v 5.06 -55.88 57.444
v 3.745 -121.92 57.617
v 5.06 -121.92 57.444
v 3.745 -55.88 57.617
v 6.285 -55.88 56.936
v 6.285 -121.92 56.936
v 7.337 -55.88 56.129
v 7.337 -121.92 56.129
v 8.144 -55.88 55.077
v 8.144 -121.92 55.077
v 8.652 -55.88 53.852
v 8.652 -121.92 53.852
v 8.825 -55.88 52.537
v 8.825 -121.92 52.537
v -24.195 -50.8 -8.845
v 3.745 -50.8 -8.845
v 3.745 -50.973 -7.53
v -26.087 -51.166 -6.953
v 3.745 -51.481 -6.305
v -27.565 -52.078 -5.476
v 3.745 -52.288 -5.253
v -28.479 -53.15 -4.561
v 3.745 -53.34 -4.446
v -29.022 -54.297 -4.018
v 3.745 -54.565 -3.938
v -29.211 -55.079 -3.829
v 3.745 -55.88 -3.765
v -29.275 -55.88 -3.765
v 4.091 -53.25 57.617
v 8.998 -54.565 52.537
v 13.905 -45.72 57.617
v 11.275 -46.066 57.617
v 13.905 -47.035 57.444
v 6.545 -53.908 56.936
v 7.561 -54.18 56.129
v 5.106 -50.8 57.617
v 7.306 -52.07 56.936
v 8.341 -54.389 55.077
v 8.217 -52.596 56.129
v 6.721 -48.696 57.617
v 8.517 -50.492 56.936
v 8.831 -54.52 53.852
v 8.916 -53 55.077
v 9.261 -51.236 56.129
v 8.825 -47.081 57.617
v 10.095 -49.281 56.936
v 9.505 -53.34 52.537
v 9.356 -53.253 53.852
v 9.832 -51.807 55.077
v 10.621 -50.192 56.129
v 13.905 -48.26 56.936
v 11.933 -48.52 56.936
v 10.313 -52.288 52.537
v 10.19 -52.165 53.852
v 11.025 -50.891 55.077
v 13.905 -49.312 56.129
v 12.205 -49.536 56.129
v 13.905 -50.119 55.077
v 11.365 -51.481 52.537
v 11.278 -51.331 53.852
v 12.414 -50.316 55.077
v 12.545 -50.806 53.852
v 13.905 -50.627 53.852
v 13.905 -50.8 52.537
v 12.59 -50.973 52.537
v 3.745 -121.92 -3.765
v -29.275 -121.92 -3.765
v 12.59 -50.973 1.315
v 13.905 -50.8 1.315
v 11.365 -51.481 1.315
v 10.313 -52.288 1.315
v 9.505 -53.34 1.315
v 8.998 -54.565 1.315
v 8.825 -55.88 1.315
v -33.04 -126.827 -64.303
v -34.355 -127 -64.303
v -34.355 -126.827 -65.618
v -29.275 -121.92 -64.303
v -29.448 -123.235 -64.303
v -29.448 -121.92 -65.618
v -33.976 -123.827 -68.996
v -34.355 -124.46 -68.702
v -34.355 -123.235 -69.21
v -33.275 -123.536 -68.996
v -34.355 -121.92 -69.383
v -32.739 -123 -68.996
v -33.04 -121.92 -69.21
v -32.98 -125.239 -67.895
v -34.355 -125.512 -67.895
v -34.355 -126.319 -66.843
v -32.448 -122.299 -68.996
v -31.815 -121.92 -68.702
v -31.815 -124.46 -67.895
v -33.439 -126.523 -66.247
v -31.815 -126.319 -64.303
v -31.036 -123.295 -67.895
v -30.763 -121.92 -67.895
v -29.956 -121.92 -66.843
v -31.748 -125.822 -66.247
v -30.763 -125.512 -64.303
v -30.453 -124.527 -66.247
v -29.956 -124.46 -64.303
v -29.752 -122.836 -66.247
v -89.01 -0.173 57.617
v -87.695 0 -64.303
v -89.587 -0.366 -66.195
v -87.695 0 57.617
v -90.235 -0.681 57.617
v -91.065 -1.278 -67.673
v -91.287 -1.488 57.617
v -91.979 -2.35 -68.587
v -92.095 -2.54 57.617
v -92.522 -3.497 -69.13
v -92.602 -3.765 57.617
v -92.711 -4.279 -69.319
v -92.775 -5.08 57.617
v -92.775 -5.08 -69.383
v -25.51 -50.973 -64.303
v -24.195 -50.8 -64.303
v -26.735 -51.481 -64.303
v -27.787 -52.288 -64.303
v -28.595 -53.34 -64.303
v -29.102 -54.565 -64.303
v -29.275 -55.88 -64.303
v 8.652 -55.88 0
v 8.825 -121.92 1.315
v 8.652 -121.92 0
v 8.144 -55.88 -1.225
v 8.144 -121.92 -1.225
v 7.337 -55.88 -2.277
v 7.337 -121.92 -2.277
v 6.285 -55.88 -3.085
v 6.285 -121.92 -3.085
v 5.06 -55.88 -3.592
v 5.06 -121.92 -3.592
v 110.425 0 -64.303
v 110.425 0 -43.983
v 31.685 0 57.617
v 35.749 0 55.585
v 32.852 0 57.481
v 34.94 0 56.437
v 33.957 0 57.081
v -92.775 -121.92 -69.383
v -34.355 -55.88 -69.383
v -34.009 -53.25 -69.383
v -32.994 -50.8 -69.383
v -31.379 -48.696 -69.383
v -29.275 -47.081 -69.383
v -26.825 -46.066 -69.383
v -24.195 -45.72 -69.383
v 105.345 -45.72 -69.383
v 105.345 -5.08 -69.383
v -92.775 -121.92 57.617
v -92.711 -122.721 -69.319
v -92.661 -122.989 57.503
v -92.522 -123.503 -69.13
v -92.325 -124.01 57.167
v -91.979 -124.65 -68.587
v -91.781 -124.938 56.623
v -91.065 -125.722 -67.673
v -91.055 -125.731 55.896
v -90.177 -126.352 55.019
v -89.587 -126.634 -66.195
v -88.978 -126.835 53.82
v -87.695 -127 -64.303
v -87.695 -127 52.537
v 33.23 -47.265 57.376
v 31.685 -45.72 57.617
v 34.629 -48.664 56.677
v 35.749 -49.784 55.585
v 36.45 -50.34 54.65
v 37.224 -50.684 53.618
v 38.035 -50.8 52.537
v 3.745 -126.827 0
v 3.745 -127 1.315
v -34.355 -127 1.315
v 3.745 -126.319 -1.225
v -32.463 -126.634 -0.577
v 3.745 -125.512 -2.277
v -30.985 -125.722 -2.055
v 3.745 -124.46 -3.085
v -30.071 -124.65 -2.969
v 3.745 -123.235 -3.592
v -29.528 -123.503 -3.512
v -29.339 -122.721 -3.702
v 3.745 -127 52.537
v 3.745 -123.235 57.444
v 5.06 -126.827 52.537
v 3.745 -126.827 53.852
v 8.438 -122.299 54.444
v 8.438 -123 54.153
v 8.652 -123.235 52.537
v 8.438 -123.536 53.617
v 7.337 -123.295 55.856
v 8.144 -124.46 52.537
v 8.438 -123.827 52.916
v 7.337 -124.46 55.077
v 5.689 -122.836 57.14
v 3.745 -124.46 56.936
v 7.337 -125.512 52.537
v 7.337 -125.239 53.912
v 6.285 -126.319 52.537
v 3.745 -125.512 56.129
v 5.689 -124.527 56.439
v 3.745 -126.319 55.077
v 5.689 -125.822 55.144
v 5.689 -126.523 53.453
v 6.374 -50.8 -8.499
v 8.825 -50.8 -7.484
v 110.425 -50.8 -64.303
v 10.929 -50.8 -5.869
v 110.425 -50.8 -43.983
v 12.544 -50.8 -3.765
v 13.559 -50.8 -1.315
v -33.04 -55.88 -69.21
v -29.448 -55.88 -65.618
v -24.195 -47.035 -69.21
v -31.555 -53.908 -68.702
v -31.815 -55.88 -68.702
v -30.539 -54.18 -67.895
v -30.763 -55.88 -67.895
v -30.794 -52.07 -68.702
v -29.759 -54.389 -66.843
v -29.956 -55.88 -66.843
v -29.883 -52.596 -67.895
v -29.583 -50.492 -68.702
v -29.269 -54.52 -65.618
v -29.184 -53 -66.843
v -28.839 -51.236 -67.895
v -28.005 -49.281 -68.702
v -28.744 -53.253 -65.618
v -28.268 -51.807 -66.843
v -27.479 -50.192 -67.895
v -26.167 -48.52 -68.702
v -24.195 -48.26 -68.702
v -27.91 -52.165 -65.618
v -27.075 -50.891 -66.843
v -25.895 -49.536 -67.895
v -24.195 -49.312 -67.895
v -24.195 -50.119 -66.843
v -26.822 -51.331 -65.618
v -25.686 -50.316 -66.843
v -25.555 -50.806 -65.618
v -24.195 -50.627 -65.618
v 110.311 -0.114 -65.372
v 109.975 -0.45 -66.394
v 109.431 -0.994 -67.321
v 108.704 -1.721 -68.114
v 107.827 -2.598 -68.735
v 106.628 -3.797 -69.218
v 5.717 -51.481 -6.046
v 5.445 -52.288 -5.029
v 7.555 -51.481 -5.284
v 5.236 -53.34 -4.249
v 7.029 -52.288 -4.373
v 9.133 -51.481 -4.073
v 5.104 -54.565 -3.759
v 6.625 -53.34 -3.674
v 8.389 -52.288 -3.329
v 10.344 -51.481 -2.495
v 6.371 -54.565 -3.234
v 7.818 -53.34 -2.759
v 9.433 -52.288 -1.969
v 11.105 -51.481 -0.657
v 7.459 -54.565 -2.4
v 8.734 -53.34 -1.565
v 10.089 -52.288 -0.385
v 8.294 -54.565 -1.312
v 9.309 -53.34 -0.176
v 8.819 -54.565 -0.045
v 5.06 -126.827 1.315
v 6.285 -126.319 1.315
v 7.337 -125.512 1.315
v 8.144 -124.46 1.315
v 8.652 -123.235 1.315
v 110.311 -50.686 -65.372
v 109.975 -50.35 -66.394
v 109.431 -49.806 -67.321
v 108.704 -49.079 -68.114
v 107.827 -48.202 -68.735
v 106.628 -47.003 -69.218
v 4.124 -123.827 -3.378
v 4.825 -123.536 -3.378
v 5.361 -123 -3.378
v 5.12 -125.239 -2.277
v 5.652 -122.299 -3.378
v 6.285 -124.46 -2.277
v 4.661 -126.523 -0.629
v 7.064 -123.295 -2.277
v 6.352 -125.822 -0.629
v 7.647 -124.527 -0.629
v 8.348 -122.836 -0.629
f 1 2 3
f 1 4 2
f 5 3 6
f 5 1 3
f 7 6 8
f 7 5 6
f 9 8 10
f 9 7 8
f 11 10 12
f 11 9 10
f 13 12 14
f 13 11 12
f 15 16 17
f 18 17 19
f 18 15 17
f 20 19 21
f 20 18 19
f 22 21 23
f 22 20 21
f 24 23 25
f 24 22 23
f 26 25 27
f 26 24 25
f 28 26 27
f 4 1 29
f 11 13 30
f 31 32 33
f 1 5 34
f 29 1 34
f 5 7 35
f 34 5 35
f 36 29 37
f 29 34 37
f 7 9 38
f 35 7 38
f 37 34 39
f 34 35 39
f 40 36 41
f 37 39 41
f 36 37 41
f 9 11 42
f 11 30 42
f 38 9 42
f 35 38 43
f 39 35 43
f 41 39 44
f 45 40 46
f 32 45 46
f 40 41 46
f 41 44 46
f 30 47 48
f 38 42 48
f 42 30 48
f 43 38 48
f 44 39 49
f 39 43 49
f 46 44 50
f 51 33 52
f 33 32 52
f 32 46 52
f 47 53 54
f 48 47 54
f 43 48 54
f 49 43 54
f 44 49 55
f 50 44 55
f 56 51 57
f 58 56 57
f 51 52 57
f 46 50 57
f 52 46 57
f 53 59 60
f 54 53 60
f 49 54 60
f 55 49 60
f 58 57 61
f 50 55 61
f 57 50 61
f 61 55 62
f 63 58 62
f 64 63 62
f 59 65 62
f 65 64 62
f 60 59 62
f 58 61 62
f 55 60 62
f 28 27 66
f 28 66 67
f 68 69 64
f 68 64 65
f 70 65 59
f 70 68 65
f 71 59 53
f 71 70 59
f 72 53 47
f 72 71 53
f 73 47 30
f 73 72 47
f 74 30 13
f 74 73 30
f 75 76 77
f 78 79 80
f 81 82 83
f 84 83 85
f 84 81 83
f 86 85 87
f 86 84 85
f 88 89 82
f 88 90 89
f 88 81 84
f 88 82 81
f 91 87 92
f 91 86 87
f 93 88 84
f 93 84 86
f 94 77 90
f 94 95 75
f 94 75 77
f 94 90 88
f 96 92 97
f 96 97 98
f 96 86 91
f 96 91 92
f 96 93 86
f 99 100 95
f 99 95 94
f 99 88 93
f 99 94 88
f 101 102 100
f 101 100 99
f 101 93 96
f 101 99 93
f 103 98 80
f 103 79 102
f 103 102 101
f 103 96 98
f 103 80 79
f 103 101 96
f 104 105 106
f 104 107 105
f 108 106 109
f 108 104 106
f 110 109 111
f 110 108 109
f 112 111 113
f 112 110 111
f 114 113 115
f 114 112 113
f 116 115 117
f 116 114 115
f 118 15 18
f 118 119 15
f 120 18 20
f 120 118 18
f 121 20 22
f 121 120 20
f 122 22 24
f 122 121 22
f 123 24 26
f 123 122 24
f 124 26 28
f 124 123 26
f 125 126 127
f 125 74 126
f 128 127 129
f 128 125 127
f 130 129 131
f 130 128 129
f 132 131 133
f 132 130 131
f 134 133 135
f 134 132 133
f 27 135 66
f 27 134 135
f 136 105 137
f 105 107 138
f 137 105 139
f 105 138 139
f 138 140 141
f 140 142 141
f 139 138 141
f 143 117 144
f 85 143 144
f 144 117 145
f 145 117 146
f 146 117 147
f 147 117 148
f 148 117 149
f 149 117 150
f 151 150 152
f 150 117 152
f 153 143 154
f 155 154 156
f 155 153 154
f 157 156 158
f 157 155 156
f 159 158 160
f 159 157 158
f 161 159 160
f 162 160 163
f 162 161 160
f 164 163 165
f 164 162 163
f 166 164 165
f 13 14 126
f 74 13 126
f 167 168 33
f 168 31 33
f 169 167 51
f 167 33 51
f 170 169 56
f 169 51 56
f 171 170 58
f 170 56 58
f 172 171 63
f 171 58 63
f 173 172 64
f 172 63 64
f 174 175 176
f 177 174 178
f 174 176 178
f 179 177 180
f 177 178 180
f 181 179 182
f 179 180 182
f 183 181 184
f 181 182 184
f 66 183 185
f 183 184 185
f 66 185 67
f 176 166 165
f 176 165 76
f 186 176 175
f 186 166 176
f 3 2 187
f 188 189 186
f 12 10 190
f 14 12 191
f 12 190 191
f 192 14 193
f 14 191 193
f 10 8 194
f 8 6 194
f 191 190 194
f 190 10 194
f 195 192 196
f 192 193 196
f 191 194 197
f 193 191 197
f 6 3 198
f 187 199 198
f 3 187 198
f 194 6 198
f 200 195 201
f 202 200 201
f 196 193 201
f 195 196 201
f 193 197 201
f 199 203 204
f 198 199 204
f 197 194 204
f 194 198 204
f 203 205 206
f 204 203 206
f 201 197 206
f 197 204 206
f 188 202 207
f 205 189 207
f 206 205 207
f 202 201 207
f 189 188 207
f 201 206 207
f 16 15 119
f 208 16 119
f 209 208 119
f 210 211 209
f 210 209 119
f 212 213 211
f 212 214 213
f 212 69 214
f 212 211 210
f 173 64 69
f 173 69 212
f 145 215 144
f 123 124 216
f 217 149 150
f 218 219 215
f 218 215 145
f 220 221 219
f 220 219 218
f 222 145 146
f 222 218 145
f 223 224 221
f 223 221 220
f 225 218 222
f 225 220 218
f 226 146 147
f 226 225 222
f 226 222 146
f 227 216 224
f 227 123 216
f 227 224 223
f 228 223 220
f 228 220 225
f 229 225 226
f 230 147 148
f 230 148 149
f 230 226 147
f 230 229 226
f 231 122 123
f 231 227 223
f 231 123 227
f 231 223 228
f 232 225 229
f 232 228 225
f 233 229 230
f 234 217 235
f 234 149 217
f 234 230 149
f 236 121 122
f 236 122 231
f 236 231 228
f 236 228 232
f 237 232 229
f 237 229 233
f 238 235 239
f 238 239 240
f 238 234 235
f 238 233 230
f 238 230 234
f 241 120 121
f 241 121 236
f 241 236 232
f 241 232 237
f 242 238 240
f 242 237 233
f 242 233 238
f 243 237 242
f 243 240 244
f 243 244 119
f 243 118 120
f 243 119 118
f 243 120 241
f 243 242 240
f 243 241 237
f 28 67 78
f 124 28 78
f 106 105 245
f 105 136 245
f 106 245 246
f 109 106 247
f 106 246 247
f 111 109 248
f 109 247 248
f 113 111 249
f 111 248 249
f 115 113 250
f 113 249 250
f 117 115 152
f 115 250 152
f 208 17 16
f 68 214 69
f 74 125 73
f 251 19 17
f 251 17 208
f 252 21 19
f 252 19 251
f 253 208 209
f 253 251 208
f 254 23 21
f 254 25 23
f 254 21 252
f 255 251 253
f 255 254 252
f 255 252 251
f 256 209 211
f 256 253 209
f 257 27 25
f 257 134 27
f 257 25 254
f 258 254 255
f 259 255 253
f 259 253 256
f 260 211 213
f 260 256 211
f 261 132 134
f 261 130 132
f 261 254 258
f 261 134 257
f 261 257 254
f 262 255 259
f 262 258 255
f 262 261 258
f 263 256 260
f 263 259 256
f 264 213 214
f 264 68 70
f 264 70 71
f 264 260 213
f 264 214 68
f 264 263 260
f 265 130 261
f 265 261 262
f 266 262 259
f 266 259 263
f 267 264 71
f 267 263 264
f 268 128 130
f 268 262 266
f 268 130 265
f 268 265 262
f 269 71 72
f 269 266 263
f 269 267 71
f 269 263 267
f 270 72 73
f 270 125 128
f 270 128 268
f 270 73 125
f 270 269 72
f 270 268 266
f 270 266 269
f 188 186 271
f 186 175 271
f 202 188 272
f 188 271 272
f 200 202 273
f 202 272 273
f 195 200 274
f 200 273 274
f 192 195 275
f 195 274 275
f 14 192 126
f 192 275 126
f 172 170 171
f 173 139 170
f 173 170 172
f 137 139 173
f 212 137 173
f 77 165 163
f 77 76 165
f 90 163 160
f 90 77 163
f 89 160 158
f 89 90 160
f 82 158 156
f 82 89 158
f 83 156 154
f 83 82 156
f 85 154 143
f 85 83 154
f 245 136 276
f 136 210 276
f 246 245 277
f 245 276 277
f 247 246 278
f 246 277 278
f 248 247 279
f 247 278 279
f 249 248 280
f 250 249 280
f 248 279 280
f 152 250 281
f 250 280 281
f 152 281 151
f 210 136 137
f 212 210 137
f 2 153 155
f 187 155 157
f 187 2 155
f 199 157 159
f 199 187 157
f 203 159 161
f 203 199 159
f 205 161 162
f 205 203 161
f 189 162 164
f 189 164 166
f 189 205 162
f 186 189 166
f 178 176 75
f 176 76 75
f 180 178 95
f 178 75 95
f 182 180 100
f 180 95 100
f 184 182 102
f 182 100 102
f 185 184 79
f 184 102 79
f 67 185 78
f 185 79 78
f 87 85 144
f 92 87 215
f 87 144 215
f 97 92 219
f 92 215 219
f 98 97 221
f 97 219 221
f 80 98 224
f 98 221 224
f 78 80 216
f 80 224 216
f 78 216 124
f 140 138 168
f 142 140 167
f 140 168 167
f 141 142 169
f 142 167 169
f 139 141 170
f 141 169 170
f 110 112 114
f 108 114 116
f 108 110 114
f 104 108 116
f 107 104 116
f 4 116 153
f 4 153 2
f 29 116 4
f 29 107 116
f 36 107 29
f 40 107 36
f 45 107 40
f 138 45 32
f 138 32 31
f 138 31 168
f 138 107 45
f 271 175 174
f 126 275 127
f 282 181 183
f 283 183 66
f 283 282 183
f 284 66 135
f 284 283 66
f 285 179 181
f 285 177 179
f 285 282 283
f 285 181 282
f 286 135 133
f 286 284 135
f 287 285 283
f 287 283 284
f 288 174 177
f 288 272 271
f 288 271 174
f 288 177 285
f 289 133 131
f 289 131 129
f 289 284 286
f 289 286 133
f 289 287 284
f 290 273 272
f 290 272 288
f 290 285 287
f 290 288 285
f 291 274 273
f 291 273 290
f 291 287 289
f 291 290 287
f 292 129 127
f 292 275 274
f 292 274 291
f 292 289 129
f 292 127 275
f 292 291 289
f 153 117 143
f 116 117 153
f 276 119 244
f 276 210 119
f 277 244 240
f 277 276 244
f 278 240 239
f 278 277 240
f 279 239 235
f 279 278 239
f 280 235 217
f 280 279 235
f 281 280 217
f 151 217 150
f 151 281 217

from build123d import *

# Parameters (mm, degrees)
F0_W     = 203.2
F0_H     = 127
F1_DEPTH = 127
F3_DEPTH = 76.2
F4_SIZE2 = 101.6
F4_SIZE  = 76.2
F5_R     = 5.08


with BuildPart() as f1:
    # F0 (on Front) → F1 (new body)
    with BuildSketch(Plane.XZ):
        with Locations((8.8248885557, -5.8830874041)):
            Rectangle(F0_W, F0_H)
    extrude(amount=F1_DEPTH)

    # F2 (on face) → F3 (cut)
    with BuildSketch(Plane.XZ.offset(127)):
        Polygon((110.4248885557, 57.6169125959), (8.8248885557, 57.6169125959), (8.8248885557, -3.765176516), (-29.2751114443, -3.765176516), (-29.2751114443, -69.3830874041), (110.4248885557, -69.3830874041), align=None)
    extrude(amount=-F3_DEPTH, mode=Mode.SUBTRACT)

    # F4
    f4_edges = [f1.edges().sort_by_distance(p)[0] for p in [
        (110.424889, -25.4, 57.616913),
    ]]
    f4_side = f1.faces().sort_by_distance((-12.94654, -52.614286, 57.616913))[0]
    chamfer(f4_edges, length=F4_SIZE, length2=F4_SIZE2, reference=f4_side)

    # F5
    f5_edges = [f1.edges().sort_by_distance(p)[0] for p in [
        (-41.975111, -127, 57.616913),
        (8.824889, -88.9, 57.616913),
        (21.524889, -50.8, 57.616913),
        (34.224889, -25.4, 57.616913),
        (8.824889, -50.8, 26.925868),
        (8.824889, -127, 26.925868),
        (-10.225111, -127, -3.765177),
        (8.824889, -88.9, -3.765177),
        (-29.275111, -127, -36.574132),
        (-29.275111, -50.8, -36.574132),
        (-61.025111, -127, -69.383087),
        (-29.275111, -88.9, -69.383087),
        (40.574889, -50.8, -69.383087),
        (110.424889, -25.4, -69.383087),
        (-92.775111, -127, -5.883087),
        (8.824889, 0, -69.383087),
        (-92.775111, 0, -5.883087),
        (-10.225111, -50.8, -3.765177),
    ]]
    fillet(f5_edges, radius=F5_R)


solid = f1.part
